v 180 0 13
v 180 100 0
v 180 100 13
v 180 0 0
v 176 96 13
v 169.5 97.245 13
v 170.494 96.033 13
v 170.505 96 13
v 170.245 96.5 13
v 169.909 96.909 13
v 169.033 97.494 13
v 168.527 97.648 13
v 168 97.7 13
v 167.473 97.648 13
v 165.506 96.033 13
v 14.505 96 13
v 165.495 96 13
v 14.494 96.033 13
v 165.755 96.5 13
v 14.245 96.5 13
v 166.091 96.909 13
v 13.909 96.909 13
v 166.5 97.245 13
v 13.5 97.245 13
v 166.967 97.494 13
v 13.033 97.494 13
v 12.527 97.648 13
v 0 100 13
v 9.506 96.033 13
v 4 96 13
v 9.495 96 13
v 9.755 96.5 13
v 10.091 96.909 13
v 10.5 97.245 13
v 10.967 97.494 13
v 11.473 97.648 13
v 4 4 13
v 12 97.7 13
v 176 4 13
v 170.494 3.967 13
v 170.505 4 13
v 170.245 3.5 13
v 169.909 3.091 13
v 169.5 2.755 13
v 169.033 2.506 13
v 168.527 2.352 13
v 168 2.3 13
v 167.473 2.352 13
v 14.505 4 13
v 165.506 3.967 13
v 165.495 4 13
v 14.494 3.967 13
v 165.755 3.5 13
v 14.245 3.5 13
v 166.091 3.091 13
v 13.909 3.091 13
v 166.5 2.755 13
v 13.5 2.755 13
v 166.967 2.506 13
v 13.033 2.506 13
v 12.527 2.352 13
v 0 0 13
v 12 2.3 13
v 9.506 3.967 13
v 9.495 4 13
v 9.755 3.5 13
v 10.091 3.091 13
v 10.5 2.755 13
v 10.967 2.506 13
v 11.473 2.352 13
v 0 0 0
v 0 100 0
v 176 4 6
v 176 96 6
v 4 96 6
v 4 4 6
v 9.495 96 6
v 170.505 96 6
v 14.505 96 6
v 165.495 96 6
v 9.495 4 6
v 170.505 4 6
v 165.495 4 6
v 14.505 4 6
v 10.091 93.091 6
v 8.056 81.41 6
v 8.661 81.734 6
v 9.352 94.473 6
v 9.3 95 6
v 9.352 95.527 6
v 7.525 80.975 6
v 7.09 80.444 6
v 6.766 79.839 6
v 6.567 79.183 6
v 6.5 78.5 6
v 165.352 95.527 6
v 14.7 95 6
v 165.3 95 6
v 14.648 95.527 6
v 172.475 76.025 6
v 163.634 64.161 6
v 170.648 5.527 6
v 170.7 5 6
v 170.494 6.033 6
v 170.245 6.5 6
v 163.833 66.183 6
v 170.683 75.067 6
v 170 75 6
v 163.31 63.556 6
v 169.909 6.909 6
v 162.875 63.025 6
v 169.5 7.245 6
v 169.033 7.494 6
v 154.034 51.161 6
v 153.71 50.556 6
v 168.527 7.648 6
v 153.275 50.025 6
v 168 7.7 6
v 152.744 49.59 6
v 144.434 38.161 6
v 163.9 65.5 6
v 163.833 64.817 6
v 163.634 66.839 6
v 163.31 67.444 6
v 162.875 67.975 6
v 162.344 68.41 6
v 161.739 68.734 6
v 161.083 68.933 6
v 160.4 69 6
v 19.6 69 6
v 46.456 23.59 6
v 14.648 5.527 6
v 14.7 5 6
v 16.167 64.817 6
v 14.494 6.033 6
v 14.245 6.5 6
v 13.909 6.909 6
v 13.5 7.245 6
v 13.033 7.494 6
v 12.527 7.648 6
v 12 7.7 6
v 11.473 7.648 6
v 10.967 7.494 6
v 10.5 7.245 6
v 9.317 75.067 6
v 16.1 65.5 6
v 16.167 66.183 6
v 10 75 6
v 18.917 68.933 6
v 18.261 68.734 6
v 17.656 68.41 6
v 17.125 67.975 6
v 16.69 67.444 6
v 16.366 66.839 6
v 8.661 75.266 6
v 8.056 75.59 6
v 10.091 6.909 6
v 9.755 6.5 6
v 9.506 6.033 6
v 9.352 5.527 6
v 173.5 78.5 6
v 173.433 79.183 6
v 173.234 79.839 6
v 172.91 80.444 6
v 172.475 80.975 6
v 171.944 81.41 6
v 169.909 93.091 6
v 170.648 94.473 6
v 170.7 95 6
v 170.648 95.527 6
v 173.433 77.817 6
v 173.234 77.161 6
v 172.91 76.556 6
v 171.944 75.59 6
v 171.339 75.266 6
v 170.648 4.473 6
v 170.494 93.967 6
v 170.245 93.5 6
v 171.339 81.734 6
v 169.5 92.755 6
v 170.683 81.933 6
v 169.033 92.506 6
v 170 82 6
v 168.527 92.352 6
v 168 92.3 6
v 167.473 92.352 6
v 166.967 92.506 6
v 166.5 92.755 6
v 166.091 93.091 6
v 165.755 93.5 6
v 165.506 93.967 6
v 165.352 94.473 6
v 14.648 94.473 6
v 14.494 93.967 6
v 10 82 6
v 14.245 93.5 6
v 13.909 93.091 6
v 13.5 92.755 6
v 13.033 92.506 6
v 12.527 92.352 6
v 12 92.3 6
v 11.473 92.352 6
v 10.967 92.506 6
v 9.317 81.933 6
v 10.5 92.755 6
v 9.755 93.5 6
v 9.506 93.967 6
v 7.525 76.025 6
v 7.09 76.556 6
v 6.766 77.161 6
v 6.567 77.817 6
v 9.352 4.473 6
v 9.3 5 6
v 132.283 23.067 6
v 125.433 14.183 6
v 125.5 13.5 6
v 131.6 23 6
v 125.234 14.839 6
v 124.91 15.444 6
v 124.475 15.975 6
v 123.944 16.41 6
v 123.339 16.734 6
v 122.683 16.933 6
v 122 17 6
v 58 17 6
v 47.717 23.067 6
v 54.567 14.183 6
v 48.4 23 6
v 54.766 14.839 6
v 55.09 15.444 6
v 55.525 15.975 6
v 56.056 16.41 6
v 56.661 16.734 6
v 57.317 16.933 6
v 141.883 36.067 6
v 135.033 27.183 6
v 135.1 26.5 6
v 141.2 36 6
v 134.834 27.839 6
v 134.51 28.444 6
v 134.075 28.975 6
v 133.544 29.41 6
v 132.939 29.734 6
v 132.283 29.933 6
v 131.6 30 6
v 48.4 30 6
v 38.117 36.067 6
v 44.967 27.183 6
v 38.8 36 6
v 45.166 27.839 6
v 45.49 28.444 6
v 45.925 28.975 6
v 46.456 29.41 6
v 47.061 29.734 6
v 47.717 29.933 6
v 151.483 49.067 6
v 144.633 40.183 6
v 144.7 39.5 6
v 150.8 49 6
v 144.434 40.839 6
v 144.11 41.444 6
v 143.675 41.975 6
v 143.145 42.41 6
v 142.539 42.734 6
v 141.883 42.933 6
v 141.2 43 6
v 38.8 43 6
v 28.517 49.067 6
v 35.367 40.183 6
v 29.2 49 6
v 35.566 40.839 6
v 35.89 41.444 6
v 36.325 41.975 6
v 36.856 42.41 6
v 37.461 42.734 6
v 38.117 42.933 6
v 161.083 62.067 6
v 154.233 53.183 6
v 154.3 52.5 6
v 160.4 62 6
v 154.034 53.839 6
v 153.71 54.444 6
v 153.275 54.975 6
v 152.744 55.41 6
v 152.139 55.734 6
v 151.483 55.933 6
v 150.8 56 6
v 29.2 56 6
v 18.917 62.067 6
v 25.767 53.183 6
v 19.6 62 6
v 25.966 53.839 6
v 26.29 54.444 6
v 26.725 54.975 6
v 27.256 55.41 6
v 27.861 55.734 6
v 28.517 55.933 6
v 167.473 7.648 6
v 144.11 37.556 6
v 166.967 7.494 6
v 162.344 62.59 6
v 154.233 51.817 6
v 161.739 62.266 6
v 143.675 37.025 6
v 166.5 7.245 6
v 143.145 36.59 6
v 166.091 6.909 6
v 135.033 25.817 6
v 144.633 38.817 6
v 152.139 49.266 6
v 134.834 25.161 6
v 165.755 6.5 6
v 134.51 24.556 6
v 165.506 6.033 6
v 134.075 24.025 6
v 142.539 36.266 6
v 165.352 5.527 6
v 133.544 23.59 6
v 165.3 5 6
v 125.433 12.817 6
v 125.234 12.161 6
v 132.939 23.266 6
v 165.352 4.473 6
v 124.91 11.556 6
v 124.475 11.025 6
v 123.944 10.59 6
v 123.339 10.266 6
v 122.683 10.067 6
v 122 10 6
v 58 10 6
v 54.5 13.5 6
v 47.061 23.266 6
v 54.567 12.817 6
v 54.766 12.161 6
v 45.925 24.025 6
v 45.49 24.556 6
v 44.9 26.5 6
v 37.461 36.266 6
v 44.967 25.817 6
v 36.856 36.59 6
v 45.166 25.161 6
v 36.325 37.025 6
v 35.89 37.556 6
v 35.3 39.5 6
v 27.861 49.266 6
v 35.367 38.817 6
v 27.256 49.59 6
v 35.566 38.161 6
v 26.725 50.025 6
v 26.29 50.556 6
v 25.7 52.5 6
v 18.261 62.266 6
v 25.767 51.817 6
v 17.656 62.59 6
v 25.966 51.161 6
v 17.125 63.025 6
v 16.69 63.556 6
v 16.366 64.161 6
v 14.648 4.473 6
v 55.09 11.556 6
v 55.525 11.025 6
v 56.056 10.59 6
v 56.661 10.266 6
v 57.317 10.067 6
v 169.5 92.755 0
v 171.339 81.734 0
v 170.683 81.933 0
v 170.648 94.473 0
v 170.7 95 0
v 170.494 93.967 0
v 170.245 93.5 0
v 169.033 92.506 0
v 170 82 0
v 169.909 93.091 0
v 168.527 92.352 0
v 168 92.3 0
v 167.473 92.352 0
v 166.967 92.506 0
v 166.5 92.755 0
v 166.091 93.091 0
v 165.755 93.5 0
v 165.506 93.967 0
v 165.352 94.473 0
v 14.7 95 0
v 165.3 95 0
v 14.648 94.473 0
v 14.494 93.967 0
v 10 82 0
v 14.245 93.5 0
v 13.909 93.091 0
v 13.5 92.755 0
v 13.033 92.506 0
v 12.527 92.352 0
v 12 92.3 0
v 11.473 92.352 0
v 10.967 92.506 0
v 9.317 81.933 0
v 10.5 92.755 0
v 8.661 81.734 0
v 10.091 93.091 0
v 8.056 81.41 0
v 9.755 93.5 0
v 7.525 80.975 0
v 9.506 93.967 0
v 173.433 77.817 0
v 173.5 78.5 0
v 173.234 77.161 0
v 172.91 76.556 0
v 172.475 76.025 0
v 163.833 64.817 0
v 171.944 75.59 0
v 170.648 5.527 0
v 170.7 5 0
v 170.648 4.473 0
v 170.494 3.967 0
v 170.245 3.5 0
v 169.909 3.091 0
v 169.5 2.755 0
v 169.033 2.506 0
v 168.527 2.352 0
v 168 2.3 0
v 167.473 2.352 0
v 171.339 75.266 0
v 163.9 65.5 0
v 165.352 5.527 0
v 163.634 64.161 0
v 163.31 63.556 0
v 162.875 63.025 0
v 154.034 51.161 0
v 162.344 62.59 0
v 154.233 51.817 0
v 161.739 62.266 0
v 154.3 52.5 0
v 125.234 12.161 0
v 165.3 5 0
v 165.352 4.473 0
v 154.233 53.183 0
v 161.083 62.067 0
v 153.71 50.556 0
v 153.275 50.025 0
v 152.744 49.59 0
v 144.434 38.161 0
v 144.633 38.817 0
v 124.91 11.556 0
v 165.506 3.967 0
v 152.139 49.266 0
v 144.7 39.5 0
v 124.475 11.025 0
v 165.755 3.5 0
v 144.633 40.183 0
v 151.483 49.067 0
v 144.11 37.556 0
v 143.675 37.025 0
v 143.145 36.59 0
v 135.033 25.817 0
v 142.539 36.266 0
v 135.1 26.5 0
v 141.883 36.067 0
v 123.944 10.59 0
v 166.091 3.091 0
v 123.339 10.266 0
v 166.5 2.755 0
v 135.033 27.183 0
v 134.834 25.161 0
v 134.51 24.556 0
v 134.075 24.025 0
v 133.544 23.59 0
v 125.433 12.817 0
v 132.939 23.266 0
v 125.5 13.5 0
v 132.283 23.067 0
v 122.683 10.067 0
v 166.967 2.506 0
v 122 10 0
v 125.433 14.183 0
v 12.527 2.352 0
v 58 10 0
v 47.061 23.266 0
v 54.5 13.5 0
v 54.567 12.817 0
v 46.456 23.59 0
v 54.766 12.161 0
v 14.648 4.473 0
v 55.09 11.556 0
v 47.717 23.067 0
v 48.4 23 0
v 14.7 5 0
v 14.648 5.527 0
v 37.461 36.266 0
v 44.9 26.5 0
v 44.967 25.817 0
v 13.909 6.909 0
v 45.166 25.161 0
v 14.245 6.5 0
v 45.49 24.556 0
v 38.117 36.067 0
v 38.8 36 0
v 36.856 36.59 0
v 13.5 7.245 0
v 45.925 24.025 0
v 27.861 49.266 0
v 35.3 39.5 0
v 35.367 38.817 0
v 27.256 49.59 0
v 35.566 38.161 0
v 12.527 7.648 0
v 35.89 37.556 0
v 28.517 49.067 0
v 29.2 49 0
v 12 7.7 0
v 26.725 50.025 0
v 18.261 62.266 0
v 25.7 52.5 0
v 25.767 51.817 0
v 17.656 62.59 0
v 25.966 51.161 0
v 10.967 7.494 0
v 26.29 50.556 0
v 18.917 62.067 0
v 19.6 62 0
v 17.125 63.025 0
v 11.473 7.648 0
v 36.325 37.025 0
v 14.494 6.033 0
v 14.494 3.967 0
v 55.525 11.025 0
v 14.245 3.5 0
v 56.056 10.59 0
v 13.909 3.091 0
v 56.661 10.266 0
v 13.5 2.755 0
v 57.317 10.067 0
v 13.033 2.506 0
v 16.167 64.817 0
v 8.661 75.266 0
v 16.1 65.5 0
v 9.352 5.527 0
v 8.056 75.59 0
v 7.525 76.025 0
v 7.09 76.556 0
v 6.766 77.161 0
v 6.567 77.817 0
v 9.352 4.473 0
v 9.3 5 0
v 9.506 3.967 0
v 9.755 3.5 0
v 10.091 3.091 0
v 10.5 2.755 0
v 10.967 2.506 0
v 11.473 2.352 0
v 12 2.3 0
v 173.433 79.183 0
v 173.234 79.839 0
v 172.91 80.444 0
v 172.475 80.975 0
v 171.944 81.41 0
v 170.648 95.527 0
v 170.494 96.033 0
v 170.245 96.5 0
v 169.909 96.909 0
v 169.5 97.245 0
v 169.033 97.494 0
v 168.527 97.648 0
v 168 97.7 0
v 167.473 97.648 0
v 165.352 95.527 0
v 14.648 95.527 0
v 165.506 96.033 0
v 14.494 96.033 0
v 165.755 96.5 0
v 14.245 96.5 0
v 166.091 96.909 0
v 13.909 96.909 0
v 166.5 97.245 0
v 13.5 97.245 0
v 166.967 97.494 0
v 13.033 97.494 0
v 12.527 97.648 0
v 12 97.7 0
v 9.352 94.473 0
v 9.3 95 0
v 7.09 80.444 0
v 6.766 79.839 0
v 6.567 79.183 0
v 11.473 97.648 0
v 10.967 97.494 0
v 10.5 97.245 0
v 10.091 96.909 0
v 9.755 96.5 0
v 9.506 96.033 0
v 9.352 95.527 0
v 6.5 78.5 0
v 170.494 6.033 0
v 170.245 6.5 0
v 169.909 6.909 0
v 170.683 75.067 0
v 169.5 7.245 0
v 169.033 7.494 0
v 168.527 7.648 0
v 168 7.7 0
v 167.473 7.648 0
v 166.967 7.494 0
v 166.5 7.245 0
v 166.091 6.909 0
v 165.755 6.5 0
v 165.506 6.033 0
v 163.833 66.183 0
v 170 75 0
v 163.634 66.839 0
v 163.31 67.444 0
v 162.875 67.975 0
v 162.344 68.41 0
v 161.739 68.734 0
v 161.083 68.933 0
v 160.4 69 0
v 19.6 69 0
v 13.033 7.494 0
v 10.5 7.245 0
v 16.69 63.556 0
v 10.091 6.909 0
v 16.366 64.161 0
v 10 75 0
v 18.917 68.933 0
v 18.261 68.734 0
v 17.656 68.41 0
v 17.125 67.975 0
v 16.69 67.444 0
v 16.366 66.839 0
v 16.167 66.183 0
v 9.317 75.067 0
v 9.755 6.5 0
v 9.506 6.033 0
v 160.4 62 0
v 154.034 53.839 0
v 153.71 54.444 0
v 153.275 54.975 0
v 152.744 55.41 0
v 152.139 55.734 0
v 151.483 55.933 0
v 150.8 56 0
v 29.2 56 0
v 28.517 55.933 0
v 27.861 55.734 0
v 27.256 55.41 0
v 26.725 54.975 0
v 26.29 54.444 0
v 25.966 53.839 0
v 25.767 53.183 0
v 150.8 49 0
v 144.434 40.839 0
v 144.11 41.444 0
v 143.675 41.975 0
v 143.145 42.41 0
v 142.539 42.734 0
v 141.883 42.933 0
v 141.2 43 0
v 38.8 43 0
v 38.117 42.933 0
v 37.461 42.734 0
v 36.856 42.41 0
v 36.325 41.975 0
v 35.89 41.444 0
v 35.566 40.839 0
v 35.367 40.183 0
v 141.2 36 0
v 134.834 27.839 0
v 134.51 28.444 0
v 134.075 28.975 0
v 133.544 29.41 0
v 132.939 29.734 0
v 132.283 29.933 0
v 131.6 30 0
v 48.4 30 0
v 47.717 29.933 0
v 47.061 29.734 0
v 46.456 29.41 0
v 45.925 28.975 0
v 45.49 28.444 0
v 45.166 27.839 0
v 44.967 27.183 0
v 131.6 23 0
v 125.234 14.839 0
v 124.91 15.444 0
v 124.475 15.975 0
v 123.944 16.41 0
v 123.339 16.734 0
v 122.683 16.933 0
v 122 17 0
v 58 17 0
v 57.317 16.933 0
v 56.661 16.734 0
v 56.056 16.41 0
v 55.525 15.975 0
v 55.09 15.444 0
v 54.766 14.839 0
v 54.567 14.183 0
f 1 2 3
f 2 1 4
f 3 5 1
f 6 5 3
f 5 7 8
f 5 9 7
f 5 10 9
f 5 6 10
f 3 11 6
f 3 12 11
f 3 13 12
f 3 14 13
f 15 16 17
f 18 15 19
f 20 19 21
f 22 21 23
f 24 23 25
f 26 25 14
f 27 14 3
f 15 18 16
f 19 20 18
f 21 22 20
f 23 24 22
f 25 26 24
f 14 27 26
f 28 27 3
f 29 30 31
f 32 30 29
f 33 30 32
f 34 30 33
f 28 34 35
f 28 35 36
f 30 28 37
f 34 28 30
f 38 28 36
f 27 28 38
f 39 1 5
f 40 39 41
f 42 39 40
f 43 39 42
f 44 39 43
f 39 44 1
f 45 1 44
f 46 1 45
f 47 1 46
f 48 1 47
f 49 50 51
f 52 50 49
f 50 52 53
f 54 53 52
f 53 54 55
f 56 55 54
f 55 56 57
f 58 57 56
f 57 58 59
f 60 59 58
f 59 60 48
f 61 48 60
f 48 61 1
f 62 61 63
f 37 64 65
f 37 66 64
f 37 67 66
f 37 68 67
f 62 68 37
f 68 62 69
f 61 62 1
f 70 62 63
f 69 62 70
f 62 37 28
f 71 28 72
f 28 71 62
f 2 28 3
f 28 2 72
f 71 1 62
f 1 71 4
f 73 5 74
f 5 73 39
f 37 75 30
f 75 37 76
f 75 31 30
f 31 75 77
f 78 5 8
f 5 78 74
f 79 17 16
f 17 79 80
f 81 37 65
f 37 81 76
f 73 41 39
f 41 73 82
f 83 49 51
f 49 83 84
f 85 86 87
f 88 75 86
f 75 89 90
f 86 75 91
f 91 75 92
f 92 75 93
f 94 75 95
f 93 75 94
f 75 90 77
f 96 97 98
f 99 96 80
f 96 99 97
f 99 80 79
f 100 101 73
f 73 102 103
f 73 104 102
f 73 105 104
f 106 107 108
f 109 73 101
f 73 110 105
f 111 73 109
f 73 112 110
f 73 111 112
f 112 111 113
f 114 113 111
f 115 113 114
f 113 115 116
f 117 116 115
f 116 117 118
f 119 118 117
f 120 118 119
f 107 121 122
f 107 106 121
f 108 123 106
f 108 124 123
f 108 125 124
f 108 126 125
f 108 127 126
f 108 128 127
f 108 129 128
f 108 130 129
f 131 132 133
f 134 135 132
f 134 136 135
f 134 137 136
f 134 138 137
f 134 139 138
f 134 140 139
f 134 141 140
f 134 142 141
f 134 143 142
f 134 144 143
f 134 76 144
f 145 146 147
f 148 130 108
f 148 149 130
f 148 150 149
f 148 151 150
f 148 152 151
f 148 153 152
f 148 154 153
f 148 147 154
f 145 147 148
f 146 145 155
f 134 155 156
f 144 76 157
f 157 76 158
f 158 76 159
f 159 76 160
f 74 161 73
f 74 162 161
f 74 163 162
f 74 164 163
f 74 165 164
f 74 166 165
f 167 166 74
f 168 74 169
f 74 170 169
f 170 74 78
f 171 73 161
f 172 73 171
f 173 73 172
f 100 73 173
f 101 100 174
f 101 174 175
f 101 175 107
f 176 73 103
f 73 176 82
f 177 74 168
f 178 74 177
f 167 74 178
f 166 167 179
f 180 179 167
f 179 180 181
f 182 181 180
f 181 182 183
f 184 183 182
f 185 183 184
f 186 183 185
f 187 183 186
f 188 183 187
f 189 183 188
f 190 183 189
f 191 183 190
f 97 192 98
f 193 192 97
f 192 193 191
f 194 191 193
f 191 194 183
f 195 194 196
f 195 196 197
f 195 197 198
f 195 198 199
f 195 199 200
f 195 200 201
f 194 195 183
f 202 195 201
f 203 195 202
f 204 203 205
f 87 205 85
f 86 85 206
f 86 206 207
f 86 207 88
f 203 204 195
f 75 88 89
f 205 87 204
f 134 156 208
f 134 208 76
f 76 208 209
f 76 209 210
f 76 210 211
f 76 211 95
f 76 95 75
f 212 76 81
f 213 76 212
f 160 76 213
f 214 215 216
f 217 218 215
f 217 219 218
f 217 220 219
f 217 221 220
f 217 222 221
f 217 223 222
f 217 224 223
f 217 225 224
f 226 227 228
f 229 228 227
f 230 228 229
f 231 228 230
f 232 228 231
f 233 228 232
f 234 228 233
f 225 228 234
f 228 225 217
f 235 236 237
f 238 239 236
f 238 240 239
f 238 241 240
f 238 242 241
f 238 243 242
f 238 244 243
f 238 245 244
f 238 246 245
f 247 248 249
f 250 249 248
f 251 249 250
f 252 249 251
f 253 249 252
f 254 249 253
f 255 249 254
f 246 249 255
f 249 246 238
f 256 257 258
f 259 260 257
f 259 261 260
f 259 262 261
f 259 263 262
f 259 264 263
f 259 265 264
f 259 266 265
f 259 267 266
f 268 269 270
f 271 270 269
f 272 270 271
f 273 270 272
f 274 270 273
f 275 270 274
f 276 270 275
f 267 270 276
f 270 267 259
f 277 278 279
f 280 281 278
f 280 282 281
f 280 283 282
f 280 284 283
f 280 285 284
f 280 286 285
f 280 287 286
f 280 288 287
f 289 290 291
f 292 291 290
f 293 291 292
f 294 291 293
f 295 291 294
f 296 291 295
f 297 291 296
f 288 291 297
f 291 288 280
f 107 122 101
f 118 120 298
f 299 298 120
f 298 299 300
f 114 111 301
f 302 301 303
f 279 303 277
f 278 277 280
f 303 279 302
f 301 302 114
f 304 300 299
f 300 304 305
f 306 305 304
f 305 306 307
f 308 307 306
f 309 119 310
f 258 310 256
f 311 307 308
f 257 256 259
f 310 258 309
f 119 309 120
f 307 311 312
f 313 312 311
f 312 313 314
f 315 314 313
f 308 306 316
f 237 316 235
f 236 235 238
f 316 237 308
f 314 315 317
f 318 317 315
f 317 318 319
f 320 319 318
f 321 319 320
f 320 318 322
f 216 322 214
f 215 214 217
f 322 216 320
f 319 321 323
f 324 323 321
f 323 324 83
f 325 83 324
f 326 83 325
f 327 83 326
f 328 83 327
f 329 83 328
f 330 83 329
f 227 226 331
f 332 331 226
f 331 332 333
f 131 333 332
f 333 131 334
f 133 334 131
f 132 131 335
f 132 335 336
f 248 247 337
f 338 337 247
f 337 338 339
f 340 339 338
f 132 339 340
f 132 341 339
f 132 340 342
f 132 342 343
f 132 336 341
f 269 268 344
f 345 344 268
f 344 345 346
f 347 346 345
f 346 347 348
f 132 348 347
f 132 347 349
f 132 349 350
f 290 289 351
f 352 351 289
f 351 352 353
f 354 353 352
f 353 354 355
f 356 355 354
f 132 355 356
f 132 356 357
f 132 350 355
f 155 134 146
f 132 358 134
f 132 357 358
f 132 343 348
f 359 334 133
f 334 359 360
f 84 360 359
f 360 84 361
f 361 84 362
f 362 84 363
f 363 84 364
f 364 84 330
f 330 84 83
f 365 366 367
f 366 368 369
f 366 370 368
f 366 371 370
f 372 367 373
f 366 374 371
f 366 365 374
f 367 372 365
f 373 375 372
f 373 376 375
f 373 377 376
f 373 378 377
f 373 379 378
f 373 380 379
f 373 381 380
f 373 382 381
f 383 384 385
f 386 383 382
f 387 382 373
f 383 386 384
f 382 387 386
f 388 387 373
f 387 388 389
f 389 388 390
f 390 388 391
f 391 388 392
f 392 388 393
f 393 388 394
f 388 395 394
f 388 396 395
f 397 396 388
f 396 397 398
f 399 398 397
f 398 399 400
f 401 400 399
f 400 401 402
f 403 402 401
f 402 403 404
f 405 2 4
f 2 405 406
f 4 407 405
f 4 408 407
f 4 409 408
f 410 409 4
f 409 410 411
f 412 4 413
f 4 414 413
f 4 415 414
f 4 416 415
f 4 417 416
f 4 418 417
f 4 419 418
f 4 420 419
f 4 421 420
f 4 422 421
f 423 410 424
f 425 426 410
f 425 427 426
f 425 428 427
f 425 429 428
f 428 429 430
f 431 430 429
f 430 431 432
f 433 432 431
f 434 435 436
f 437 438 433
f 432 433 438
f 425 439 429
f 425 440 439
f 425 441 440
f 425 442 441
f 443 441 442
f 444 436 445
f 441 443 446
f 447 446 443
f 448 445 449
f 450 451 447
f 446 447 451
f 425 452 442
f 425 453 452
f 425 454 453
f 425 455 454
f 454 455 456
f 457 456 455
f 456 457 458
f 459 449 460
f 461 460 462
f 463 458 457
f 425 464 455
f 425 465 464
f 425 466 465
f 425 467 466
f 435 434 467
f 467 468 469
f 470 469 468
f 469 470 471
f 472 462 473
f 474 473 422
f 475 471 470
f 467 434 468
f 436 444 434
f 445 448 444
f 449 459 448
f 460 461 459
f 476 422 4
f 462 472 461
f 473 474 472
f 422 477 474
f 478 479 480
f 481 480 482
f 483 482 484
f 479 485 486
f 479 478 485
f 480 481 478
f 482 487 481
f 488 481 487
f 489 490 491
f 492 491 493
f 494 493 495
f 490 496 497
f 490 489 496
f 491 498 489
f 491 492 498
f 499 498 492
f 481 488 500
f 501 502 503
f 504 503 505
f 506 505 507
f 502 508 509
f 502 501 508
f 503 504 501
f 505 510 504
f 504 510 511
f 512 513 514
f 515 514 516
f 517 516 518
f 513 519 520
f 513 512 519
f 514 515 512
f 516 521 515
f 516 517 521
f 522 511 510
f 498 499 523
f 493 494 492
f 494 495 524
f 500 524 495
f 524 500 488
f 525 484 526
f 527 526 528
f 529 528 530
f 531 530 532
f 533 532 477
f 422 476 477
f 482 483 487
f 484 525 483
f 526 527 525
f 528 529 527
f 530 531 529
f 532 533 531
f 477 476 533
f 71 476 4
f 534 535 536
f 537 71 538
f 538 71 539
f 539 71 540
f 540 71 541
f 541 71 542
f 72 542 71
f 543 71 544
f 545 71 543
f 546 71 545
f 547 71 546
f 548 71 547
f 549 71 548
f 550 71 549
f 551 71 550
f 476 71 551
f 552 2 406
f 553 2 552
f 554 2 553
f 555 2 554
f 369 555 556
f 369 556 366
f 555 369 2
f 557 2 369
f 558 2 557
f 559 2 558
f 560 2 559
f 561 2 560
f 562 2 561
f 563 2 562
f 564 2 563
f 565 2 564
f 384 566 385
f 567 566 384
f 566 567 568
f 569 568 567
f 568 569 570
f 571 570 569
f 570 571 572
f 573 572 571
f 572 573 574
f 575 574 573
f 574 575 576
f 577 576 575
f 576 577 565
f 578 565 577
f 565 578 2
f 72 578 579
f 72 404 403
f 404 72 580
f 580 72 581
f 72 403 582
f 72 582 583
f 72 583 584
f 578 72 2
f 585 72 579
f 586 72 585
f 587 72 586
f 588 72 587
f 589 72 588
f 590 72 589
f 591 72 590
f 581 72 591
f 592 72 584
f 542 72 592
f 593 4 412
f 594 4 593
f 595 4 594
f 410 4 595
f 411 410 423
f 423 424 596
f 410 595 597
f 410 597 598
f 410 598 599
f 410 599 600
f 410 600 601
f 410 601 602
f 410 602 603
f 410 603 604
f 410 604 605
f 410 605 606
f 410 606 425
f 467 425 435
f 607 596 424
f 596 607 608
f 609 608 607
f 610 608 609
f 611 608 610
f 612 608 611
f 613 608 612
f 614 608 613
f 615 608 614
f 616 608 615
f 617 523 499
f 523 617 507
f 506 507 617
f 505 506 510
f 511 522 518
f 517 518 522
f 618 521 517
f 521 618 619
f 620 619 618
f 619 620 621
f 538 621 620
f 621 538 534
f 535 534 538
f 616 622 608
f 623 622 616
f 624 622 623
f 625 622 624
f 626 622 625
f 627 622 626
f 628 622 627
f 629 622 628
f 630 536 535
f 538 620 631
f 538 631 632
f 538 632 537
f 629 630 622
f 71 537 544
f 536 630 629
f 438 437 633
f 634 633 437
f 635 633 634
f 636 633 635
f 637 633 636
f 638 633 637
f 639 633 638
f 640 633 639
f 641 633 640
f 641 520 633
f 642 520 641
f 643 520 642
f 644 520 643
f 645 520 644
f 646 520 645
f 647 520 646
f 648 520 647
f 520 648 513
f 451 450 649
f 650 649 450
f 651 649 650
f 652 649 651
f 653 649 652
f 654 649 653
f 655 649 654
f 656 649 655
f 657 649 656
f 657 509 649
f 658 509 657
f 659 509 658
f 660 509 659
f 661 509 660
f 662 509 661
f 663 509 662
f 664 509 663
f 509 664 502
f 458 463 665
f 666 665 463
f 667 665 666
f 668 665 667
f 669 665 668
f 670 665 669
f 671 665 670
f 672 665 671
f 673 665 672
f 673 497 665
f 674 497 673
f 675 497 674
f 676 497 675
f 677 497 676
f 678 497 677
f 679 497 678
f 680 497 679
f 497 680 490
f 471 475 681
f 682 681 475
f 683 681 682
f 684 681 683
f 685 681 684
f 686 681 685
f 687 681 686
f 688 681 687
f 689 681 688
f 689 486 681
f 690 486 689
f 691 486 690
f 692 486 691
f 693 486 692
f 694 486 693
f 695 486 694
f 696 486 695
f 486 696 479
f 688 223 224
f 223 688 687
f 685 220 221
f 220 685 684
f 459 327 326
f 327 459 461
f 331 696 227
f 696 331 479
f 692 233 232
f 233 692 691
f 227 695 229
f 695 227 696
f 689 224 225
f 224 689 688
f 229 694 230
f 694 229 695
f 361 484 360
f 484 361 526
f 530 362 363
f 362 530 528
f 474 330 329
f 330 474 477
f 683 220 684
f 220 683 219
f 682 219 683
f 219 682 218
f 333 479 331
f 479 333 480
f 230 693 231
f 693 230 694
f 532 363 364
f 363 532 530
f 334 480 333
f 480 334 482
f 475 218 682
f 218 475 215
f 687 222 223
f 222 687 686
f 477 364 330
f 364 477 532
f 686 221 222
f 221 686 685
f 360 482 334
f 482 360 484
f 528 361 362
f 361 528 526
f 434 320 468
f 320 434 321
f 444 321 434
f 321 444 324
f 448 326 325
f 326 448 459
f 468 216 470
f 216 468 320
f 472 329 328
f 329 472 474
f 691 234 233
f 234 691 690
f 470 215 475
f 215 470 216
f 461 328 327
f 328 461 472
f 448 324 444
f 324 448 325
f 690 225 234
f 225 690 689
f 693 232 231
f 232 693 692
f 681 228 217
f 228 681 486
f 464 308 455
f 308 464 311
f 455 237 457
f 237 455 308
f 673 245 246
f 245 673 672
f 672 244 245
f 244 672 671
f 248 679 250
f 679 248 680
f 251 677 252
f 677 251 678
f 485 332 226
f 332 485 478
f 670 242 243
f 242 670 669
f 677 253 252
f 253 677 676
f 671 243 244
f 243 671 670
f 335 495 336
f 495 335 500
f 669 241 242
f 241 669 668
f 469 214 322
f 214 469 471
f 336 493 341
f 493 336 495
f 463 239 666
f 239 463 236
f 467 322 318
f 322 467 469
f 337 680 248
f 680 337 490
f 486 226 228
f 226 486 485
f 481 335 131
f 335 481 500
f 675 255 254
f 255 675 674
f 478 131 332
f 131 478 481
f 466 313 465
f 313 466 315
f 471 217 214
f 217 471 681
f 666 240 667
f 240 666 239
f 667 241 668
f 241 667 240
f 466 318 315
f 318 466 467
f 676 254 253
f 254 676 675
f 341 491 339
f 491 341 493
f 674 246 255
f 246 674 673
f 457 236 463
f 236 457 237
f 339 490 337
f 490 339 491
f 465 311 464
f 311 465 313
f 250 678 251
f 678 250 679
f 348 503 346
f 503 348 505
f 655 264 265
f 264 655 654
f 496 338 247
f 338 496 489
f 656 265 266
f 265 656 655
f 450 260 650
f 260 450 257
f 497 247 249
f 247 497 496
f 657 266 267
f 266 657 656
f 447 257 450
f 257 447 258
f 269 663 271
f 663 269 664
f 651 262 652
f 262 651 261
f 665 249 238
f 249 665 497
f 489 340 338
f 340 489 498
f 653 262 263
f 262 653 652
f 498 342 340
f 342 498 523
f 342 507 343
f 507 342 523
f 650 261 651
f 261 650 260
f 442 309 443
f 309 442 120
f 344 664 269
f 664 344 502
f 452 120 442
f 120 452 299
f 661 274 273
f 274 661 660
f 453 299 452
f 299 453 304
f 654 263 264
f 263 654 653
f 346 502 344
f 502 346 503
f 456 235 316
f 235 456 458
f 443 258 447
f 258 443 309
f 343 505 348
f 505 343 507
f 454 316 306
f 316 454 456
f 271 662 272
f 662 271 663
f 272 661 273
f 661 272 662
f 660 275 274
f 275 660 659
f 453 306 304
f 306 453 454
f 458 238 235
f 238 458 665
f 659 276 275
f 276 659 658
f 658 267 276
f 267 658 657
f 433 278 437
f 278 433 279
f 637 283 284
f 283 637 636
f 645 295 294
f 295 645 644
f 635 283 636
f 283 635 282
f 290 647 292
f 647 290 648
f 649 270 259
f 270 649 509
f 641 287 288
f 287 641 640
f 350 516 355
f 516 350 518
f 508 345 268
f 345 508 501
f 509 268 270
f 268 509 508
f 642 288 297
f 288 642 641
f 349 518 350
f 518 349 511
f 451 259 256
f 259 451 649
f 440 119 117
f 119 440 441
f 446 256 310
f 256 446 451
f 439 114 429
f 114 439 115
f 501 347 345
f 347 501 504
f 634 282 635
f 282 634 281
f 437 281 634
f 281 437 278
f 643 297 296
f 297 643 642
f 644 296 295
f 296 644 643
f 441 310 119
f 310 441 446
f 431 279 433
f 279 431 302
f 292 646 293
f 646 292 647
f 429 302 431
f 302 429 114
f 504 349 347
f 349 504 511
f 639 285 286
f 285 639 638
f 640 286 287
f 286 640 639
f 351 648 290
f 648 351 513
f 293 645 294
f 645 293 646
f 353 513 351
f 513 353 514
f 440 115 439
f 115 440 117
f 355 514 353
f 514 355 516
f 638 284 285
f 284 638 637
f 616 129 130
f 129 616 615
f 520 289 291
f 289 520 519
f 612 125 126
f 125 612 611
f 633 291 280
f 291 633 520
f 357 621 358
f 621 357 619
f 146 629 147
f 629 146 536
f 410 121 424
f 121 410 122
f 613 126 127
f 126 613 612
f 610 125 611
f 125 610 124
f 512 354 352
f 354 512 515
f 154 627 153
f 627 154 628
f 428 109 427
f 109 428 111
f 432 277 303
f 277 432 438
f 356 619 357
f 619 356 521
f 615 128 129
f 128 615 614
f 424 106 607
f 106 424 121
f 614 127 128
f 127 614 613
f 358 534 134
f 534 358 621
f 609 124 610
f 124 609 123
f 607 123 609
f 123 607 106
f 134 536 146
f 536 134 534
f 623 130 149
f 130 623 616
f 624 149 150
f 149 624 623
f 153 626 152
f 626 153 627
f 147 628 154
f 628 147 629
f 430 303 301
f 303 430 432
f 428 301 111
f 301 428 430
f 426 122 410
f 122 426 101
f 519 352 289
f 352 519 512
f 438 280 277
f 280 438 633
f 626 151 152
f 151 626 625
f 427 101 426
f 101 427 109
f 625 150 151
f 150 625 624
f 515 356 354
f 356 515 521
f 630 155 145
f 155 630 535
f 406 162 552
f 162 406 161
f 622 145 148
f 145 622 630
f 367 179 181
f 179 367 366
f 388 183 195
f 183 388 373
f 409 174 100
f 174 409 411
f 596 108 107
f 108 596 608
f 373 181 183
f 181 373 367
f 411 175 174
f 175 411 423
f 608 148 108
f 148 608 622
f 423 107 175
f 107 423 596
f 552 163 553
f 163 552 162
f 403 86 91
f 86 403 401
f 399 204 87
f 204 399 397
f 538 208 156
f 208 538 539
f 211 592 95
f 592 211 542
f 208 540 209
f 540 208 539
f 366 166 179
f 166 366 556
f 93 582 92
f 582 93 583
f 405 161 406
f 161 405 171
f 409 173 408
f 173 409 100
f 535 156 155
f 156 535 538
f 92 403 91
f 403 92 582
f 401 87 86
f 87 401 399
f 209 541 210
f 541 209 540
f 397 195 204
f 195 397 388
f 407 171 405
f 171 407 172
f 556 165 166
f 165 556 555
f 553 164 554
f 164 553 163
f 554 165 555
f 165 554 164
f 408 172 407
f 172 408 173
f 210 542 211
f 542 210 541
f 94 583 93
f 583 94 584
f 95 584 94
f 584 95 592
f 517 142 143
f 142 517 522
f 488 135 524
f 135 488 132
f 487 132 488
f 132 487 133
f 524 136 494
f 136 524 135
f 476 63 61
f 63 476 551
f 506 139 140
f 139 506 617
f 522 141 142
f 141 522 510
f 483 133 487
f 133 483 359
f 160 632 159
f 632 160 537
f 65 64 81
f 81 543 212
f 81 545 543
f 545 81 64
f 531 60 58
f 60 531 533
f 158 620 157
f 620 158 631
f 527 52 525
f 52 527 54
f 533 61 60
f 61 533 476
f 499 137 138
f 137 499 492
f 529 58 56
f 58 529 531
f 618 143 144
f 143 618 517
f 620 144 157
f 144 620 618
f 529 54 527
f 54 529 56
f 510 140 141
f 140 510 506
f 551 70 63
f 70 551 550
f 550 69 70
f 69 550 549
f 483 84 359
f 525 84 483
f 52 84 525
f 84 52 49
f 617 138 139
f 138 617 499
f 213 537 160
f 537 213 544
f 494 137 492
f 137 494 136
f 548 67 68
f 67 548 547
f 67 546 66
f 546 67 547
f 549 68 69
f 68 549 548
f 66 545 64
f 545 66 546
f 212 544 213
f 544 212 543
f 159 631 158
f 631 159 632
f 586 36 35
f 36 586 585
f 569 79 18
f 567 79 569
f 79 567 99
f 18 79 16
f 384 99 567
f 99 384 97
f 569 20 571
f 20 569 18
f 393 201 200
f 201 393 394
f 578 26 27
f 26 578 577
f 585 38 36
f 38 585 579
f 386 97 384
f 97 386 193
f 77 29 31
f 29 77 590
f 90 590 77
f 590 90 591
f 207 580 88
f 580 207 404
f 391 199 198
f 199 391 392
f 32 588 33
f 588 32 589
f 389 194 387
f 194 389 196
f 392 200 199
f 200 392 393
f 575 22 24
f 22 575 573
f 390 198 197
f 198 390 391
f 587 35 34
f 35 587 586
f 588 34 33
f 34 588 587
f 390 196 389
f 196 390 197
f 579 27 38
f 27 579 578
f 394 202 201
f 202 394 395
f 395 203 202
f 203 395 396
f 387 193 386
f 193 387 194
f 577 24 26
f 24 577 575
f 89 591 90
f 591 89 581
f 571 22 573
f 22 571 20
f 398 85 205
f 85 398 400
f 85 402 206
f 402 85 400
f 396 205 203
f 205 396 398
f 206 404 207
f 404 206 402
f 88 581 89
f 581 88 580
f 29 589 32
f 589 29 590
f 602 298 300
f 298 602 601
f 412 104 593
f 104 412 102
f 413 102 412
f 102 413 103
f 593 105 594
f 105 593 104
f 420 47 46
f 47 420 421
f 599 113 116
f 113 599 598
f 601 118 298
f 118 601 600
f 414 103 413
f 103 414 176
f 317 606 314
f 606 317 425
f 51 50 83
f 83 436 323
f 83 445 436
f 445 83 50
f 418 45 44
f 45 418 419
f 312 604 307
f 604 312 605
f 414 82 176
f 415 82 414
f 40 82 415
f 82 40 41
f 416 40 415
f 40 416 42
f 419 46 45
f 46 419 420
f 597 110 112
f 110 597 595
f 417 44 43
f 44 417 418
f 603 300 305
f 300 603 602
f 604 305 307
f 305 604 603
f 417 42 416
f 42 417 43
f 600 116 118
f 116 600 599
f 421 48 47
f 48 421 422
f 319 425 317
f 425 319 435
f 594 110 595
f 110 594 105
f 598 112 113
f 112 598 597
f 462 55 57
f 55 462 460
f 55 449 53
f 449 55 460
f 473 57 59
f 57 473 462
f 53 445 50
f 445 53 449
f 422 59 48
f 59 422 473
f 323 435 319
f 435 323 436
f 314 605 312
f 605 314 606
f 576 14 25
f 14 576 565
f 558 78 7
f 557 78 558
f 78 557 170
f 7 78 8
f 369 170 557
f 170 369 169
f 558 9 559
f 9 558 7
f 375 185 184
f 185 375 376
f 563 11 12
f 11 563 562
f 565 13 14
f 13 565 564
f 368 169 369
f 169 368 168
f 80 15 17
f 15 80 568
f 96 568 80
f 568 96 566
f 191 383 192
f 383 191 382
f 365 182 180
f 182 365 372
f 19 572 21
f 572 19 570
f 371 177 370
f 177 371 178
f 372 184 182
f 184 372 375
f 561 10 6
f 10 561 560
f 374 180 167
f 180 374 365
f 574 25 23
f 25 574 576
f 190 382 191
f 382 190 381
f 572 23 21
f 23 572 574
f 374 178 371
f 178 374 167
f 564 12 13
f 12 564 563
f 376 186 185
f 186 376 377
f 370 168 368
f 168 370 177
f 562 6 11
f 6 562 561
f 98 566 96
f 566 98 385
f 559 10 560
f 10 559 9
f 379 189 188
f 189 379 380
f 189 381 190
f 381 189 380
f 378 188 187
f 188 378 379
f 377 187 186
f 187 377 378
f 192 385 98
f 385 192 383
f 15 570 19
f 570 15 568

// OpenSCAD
$fn = 32;

// ----------------------------------------------------------------------
// Slotted panel: 180 x 100 mm, 6 рядов of slots
// ----------------------------------------------------------------------

// --- parameters (mm) ---
panel_w = 180;            // panel width
panel_d = 100;            // panel depth
thick = 6;                // panel thickness
slot_w = 7;               // slot width
pitch0 = 13;              // first row pitch
pitch_step = 1.2;         // pitch increase per row
margin = 10;              // margin around the slot field
rows = 6;                 // number of slot rows
mount_d = 5.4;            // mounting holes
mount_x = 78;             // mounting hole offset
rim_h = 13;               // rim height
rim_t = 4;                // rim wall thickness

difference() {
  union() {
    cube([panel_w, panel_d, thick]);
    translate([0, 0, thick - 1]) difference() {
      cube([panel_w, panel_d, rim_h - thick + 1]);
      translate([rim_t, rim_t, -2.5]) cube([panel_w - 2 * rim_t, panel_d - 2 * rim_t, rim_h - thick + 6]);
    }
  }
  /* slot rows: stadium shaped cutters, 2.5 mm clear of both faces */
  /* row 0: pitch 13, length 64 */
  hull() {
    translate([58, 13.5, -2.5]) cylinder(h = thick + 5, d = slot_w);
    translate([122, 13.5, -2.5]) cylinder(h = thick + 5, d = slot_w);
  }
  /* row 1: pitch 13, length 83.2 */
  hull() {
    translate([48.4, 26.5, -2.5]) cylinder(h = thick + 5, d = slot_w);
    translate([131.6, 26.5, -2.5]) cylinder(h = thick + 5, d = slot_w);
  }
  /* row 2: pitch 13, length 102.4 */
  hull() {
    translate([38.8, 39.5, -2.5]) cylinder(h = thick + 5, d = slot_w);
    translate([141.2, 39.5, -2.5]) cylinder(h = thick + 5, d = slot_w);
  }
  /* row 3: pitch 13, length 121.6 */
  hull() {
    translate([29.2, 52.5, -2.5]) cylinder(h = thick + 5, d = slot_w);
    translate([150.8, 52.5, -2.5]) cylinder(h = thick + 5, d = slot_w);
  }
  /* row 4: pitch 13, length 140.8 */
  hull() {
    translate([19.6, 65.5, -2.5]) cylinder(h = thick + 5, d = slot_w);
    translate([160.4, 65.5, -2.5]) cylinder(h = thick + 5, d = slot_w);
  }
  /* row 5: pitch 13, length 160 */
  hull() {
    translate([10, 78.5, -2.5]) cylinder(h = thick + 5, d = slot_w);
    translate([170, 78.5, -2.5]) cylinder(h = thick + 5, d = slot_w);
  }
  translate([12, 5, -2.5]) cylinder(h = 18, d = mount_d);
  translate([12, 95, -2.5]) cylinder(h = 18, d = mount_d);
  translate([168, 5, -2.5]) cylinder(h = 18, d = mount_d);
  translate([168, 95, -2.5]) cylinder(h = 18, d = mount_d);
}
